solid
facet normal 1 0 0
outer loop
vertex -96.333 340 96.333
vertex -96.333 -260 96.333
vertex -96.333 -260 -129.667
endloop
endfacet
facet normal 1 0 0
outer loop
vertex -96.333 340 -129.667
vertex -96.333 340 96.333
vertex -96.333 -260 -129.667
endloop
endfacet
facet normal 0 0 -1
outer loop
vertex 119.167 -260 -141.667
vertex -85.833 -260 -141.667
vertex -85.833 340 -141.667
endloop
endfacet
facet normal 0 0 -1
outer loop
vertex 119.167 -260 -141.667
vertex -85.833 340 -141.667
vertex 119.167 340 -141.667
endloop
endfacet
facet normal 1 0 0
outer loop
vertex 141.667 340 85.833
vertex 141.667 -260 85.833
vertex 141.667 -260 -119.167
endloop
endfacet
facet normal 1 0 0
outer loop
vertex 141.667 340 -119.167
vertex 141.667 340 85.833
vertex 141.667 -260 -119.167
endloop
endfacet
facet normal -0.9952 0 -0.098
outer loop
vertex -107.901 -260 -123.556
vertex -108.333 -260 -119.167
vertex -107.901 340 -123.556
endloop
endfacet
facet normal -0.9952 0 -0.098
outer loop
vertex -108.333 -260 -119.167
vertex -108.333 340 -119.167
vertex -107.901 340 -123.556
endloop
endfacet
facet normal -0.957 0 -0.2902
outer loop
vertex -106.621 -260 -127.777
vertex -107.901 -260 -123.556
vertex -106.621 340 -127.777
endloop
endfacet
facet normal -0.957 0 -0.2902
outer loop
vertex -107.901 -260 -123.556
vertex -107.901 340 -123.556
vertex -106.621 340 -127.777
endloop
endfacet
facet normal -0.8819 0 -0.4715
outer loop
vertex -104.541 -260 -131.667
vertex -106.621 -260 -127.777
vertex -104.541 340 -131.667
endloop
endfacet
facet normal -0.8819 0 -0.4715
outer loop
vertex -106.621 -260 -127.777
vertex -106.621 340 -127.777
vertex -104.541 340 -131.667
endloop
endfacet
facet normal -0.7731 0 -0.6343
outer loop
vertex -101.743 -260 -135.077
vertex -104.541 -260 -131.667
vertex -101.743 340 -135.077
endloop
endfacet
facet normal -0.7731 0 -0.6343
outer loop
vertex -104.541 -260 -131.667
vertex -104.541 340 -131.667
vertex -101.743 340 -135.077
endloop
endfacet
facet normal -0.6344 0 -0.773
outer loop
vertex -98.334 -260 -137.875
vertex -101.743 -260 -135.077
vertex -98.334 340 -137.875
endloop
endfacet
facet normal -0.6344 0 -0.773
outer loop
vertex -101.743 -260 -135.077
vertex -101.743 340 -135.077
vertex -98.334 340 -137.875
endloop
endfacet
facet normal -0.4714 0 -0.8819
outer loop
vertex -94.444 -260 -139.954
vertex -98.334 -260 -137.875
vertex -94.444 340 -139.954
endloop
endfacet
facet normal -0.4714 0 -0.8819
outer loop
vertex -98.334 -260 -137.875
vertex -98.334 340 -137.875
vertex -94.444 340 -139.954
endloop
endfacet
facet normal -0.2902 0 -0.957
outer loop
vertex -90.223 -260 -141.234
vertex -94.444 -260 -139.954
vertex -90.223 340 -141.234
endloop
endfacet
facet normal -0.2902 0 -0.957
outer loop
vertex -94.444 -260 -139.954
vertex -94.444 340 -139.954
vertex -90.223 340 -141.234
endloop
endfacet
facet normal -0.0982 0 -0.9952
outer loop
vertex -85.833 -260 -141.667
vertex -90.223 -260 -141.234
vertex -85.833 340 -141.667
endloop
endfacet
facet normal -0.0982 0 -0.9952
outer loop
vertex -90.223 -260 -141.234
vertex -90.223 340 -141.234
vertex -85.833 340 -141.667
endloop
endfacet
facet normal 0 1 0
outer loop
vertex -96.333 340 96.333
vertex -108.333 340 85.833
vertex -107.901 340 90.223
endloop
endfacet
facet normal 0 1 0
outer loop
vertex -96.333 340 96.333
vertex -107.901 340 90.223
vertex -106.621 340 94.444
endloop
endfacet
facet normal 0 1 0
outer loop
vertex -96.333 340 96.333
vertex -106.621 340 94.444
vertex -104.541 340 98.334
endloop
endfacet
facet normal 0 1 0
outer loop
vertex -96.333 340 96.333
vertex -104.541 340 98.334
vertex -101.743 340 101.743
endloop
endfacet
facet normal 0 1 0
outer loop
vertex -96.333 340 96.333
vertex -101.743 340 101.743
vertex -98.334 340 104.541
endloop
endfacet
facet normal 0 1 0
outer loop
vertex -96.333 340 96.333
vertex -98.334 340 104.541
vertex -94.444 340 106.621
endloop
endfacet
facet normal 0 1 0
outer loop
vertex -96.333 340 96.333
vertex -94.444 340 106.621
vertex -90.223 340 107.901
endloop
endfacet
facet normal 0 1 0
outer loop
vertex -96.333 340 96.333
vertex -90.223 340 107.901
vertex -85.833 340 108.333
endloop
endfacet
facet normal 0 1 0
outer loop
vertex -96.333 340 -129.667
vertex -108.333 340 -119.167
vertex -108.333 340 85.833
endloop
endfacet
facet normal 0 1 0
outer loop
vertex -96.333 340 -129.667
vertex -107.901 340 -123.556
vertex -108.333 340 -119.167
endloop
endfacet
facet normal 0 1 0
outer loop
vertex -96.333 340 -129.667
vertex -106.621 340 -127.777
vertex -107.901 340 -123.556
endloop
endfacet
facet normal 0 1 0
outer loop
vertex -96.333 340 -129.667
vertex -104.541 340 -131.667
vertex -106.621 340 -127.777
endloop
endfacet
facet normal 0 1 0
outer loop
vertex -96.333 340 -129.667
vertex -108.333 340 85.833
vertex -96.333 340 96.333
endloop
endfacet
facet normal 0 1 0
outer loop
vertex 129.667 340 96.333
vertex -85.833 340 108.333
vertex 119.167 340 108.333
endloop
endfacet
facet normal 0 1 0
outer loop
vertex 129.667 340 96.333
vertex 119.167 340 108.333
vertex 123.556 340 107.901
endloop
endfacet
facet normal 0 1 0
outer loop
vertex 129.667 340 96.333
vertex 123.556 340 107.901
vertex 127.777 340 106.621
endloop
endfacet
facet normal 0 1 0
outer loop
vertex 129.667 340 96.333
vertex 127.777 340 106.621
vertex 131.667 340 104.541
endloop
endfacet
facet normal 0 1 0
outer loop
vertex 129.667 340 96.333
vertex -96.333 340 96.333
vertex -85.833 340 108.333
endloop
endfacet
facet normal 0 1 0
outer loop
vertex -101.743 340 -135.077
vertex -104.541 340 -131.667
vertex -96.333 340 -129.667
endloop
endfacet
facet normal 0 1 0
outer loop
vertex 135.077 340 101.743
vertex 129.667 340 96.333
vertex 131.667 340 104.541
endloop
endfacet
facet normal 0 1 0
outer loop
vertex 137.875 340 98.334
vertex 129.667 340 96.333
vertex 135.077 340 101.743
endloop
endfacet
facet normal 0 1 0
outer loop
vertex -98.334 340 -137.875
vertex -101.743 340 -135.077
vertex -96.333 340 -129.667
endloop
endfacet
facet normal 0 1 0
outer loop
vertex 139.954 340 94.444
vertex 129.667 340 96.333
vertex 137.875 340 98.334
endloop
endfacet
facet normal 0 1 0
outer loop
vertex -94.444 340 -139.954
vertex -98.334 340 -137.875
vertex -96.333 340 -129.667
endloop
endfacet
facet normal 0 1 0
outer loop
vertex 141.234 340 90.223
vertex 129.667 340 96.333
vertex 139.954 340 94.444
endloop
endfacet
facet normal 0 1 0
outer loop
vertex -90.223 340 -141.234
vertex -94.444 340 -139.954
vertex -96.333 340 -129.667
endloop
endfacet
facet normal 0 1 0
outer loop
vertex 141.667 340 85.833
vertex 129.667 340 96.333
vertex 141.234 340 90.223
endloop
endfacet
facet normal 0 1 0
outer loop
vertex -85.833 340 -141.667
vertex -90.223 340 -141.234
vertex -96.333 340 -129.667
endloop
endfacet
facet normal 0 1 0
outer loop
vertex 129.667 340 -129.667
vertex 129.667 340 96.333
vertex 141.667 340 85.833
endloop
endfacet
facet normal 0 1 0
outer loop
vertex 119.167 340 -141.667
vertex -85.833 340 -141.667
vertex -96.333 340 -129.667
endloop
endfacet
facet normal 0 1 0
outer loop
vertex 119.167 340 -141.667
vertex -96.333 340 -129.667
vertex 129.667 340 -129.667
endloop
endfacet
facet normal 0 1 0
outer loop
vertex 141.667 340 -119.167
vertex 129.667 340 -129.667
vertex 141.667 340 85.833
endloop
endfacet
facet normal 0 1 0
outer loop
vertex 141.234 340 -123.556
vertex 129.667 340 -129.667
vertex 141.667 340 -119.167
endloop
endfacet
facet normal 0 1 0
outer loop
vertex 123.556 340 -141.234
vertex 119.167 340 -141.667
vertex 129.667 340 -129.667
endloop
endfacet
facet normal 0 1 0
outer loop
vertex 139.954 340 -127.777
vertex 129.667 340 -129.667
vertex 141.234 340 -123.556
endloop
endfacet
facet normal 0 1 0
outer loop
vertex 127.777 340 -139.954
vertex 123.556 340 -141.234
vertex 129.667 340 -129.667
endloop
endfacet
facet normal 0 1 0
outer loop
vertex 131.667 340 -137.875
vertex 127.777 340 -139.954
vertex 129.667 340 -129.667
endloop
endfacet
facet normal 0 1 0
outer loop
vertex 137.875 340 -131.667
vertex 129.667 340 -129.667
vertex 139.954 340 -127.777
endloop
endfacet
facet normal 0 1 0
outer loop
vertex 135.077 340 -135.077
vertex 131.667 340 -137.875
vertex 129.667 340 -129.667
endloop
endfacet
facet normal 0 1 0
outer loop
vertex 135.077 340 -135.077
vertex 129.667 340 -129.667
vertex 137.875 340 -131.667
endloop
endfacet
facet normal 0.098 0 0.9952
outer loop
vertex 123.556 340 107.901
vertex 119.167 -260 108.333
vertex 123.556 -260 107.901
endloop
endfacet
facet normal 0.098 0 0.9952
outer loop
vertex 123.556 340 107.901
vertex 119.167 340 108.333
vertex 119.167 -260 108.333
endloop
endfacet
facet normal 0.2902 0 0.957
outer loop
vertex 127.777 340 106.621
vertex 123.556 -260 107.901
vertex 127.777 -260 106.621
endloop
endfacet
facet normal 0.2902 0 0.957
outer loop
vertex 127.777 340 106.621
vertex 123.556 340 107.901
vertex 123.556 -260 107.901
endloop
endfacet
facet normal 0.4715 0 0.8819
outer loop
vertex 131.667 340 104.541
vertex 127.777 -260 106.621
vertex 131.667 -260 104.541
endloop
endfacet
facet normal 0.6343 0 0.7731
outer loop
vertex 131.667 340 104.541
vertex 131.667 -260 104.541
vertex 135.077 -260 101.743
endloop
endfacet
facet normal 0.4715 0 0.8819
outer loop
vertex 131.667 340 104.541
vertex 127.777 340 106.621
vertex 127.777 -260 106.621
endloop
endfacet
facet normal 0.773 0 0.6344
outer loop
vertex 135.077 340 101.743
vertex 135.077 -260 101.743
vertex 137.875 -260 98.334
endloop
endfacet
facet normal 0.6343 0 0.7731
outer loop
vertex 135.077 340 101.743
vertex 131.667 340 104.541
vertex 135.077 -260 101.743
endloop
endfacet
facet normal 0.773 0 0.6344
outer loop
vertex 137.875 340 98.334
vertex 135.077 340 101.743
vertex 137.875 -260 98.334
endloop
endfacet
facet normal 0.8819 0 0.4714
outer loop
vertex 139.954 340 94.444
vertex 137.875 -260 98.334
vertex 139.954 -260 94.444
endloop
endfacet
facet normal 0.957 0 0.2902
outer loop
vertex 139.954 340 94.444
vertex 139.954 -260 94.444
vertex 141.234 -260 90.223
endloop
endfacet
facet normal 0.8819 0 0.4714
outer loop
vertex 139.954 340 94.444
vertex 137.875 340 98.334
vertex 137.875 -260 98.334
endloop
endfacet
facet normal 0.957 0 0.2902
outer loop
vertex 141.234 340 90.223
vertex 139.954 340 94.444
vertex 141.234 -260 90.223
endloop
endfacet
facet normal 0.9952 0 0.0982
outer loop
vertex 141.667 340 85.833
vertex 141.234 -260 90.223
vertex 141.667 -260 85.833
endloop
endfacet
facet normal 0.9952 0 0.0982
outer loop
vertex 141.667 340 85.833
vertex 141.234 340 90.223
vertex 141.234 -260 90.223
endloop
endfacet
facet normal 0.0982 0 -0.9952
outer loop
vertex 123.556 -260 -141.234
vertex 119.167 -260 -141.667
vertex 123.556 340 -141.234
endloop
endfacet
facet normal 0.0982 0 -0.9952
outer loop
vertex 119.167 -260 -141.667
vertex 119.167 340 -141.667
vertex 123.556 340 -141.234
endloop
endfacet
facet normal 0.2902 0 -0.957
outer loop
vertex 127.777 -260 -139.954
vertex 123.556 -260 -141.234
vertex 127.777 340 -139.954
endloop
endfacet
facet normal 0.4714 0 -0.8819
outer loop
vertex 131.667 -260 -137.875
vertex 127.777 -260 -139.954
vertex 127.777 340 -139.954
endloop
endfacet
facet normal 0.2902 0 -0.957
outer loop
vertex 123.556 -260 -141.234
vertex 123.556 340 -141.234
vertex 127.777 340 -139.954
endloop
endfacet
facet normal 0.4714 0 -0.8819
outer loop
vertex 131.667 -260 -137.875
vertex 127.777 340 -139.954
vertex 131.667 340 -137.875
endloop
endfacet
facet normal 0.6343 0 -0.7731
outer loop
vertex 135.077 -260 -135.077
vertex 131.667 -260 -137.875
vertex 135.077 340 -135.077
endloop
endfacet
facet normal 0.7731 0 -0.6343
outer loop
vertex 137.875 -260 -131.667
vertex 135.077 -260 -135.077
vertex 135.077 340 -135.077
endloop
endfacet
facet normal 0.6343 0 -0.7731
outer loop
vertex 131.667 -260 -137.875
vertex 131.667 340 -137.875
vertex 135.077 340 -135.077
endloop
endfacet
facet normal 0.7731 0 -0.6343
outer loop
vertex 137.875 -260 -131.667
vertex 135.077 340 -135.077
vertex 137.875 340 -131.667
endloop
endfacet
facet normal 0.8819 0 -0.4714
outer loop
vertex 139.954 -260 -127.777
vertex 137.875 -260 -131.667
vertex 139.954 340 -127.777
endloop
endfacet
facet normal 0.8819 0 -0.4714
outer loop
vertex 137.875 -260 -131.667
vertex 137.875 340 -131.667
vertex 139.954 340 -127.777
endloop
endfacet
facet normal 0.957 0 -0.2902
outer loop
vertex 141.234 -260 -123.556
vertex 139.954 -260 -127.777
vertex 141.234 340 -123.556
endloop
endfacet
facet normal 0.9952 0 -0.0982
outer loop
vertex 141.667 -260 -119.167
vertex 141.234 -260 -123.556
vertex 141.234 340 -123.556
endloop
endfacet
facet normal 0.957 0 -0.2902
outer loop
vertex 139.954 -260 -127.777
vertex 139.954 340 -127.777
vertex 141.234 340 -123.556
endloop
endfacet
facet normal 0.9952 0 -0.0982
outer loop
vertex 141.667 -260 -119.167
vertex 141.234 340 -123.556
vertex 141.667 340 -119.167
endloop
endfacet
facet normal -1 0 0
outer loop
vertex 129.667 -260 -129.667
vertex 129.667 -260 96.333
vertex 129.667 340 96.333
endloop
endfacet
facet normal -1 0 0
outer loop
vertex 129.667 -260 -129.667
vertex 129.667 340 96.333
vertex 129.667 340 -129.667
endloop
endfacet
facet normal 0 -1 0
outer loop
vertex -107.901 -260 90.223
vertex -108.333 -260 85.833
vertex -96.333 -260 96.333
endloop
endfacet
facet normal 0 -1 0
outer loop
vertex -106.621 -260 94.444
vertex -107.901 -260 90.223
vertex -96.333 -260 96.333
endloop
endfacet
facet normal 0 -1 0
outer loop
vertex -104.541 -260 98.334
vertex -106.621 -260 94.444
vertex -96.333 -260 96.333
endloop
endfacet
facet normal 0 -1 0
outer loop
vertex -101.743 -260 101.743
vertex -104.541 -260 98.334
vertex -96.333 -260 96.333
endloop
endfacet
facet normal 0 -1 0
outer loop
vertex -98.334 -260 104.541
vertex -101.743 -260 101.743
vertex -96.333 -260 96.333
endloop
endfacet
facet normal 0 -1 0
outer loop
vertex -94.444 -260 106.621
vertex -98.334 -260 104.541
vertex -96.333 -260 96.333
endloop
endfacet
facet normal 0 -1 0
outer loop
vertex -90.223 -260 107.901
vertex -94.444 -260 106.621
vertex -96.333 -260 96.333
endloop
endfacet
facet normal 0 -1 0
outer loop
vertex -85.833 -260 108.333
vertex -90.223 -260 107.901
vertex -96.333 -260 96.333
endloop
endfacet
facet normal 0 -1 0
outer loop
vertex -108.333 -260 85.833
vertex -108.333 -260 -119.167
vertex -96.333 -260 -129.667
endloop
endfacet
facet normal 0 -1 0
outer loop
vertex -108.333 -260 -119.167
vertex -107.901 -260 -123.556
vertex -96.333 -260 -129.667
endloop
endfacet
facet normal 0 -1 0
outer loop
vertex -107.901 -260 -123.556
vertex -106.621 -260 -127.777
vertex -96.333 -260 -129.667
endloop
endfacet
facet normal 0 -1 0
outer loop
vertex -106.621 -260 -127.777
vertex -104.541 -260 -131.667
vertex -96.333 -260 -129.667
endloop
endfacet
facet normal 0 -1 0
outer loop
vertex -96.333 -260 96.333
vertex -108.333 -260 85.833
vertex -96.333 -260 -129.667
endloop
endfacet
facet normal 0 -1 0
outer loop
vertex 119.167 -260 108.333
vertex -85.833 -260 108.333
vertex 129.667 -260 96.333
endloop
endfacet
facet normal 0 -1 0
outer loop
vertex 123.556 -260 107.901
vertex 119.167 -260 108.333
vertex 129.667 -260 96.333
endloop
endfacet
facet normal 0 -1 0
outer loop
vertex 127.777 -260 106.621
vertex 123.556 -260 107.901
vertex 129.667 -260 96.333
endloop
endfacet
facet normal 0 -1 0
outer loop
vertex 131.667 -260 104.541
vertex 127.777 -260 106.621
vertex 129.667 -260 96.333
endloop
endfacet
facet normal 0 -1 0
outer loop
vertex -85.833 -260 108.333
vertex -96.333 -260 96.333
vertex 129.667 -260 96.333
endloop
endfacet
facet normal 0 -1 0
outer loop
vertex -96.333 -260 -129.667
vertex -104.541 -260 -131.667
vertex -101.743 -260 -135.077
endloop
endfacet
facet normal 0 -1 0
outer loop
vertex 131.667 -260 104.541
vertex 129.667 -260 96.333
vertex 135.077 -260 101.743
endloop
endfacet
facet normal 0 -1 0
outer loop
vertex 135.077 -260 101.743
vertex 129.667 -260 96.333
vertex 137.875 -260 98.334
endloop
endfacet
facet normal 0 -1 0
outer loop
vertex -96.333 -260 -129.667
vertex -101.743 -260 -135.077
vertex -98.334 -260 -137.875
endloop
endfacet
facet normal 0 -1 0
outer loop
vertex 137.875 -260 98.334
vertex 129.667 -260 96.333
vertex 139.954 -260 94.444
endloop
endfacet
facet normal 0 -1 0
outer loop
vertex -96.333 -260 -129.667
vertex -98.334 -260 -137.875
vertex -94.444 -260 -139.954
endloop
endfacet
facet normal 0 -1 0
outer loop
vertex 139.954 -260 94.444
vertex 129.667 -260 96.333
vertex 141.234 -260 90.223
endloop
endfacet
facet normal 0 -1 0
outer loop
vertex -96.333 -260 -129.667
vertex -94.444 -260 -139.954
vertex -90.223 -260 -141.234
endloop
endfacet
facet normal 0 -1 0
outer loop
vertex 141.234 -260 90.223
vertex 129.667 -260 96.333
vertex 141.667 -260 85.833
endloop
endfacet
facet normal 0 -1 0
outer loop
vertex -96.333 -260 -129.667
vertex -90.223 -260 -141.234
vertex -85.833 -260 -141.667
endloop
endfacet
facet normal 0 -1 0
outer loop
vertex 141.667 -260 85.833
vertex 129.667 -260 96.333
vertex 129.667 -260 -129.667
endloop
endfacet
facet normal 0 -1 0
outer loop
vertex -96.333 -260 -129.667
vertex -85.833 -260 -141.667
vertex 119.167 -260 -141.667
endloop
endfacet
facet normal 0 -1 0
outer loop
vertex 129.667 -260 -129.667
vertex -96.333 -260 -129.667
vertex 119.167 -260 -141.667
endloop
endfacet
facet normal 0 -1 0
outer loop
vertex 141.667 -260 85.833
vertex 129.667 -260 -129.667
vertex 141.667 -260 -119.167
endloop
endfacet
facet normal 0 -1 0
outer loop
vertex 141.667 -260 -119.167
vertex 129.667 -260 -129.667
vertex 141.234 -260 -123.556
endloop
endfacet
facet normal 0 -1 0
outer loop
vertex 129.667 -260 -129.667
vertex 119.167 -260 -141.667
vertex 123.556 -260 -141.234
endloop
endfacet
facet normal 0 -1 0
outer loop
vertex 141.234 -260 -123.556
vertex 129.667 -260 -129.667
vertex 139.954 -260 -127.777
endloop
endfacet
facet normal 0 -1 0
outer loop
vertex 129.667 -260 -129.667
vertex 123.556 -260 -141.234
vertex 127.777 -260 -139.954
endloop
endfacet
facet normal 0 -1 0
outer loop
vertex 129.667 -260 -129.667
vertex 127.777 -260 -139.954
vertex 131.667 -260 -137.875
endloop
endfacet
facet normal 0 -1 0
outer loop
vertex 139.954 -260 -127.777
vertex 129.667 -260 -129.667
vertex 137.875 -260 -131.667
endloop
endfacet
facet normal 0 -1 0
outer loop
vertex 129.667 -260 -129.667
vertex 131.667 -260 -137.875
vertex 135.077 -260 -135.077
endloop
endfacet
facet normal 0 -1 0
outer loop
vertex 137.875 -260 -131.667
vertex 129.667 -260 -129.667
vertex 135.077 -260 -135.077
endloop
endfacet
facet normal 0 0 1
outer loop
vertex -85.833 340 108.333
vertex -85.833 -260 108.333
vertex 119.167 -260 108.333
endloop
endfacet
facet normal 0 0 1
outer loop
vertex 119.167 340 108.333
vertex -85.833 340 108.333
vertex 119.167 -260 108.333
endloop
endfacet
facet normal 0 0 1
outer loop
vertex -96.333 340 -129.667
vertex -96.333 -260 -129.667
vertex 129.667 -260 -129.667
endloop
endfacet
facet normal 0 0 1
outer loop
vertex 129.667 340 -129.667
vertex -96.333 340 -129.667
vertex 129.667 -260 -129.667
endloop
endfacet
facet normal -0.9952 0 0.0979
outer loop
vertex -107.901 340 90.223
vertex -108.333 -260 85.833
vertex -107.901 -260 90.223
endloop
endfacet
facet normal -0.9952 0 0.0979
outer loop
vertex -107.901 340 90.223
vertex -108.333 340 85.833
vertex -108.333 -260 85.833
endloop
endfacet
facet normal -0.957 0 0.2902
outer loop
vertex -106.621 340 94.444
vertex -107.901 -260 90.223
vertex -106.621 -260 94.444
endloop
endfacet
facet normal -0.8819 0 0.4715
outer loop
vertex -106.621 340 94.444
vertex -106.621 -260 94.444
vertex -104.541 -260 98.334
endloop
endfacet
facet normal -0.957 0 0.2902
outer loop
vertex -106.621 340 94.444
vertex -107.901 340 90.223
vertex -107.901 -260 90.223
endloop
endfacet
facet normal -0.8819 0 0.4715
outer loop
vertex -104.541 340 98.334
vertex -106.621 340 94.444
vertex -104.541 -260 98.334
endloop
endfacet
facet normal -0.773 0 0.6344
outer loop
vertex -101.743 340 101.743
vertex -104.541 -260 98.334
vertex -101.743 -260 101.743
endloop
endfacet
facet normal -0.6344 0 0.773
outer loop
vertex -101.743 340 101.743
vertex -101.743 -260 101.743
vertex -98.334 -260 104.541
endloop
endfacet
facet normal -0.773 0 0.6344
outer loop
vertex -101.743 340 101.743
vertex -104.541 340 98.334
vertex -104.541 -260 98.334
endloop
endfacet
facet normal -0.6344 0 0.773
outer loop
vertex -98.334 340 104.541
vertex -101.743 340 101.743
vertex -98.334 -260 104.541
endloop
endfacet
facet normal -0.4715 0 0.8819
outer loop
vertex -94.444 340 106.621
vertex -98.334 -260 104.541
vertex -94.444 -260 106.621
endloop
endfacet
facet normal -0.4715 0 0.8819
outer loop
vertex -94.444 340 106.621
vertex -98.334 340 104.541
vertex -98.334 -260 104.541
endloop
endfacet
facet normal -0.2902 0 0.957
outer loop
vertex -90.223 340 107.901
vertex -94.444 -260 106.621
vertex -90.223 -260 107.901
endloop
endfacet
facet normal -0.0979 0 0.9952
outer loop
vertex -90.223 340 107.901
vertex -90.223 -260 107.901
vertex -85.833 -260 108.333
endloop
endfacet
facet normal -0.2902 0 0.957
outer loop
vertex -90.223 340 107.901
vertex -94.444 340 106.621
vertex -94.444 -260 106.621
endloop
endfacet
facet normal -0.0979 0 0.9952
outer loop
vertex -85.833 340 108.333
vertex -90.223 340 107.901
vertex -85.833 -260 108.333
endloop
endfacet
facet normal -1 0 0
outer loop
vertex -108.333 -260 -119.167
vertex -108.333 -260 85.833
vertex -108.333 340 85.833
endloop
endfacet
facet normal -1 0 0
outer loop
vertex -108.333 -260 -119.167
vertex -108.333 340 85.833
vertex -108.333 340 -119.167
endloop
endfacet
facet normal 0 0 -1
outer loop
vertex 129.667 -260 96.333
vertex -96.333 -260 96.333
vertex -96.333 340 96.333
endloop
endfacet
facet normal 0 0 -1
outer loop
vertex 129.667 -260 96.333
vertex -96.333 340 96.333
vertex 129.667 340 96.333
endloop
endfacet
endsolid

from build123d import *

# Parameters (mm, degrees)
SKETCH1_W           = 33.333333333
SKETCH1_H           = 33.333333333
SKETCH1_W_2         = 30.133333333
SKETCH1_H_2         = 30.133333333
BOSS_EXTRUDE1_DEPTH = 80
FILLET2_R           = 3
SCALE1_SCALE        = 7.5


with BuildPart() as part:
    # Sketch1 → Boss-Extrude1 (new body)
    with BuildSketch(Plane(origin=(0, 0, 0), x_dir=(1, 0, 0), z_dir=(0, 1, 0))):
        with Locations((16.666666666, 16.666666666)):
            Rectangle(SKETCH1_W, SKETCH1_H)
        with Locations((16.666666666, 16.666666666)):
            Rectangle(SKETCH1_W_2, SKETCH1_H_2, mode=Mode.SUBTRACT)
    extrude(amount=BOSS_EXTRUDE1_DEPTH)

    # Fillet2
    fillet2_edges = [part.edges().sort_by_distance(p)[0] for p in [
        (0, 40, -33.333333333),
        (33.333333333, 40, -33.333333333),
        (33.333333333, 40, 0),
        (0, 40, 0),
    ]]
    fillet(fillet2_edges, radius=FILLET2_R)


with BuildPart() as part_1:
    # Scale1: scaled about (16.666666667, 40, -16.666666667)
    add(part.part.scale(SCALE1_SCALE).moved(Location((-108.333333336, -260, 108.333333336))))


solid = part_1.part
